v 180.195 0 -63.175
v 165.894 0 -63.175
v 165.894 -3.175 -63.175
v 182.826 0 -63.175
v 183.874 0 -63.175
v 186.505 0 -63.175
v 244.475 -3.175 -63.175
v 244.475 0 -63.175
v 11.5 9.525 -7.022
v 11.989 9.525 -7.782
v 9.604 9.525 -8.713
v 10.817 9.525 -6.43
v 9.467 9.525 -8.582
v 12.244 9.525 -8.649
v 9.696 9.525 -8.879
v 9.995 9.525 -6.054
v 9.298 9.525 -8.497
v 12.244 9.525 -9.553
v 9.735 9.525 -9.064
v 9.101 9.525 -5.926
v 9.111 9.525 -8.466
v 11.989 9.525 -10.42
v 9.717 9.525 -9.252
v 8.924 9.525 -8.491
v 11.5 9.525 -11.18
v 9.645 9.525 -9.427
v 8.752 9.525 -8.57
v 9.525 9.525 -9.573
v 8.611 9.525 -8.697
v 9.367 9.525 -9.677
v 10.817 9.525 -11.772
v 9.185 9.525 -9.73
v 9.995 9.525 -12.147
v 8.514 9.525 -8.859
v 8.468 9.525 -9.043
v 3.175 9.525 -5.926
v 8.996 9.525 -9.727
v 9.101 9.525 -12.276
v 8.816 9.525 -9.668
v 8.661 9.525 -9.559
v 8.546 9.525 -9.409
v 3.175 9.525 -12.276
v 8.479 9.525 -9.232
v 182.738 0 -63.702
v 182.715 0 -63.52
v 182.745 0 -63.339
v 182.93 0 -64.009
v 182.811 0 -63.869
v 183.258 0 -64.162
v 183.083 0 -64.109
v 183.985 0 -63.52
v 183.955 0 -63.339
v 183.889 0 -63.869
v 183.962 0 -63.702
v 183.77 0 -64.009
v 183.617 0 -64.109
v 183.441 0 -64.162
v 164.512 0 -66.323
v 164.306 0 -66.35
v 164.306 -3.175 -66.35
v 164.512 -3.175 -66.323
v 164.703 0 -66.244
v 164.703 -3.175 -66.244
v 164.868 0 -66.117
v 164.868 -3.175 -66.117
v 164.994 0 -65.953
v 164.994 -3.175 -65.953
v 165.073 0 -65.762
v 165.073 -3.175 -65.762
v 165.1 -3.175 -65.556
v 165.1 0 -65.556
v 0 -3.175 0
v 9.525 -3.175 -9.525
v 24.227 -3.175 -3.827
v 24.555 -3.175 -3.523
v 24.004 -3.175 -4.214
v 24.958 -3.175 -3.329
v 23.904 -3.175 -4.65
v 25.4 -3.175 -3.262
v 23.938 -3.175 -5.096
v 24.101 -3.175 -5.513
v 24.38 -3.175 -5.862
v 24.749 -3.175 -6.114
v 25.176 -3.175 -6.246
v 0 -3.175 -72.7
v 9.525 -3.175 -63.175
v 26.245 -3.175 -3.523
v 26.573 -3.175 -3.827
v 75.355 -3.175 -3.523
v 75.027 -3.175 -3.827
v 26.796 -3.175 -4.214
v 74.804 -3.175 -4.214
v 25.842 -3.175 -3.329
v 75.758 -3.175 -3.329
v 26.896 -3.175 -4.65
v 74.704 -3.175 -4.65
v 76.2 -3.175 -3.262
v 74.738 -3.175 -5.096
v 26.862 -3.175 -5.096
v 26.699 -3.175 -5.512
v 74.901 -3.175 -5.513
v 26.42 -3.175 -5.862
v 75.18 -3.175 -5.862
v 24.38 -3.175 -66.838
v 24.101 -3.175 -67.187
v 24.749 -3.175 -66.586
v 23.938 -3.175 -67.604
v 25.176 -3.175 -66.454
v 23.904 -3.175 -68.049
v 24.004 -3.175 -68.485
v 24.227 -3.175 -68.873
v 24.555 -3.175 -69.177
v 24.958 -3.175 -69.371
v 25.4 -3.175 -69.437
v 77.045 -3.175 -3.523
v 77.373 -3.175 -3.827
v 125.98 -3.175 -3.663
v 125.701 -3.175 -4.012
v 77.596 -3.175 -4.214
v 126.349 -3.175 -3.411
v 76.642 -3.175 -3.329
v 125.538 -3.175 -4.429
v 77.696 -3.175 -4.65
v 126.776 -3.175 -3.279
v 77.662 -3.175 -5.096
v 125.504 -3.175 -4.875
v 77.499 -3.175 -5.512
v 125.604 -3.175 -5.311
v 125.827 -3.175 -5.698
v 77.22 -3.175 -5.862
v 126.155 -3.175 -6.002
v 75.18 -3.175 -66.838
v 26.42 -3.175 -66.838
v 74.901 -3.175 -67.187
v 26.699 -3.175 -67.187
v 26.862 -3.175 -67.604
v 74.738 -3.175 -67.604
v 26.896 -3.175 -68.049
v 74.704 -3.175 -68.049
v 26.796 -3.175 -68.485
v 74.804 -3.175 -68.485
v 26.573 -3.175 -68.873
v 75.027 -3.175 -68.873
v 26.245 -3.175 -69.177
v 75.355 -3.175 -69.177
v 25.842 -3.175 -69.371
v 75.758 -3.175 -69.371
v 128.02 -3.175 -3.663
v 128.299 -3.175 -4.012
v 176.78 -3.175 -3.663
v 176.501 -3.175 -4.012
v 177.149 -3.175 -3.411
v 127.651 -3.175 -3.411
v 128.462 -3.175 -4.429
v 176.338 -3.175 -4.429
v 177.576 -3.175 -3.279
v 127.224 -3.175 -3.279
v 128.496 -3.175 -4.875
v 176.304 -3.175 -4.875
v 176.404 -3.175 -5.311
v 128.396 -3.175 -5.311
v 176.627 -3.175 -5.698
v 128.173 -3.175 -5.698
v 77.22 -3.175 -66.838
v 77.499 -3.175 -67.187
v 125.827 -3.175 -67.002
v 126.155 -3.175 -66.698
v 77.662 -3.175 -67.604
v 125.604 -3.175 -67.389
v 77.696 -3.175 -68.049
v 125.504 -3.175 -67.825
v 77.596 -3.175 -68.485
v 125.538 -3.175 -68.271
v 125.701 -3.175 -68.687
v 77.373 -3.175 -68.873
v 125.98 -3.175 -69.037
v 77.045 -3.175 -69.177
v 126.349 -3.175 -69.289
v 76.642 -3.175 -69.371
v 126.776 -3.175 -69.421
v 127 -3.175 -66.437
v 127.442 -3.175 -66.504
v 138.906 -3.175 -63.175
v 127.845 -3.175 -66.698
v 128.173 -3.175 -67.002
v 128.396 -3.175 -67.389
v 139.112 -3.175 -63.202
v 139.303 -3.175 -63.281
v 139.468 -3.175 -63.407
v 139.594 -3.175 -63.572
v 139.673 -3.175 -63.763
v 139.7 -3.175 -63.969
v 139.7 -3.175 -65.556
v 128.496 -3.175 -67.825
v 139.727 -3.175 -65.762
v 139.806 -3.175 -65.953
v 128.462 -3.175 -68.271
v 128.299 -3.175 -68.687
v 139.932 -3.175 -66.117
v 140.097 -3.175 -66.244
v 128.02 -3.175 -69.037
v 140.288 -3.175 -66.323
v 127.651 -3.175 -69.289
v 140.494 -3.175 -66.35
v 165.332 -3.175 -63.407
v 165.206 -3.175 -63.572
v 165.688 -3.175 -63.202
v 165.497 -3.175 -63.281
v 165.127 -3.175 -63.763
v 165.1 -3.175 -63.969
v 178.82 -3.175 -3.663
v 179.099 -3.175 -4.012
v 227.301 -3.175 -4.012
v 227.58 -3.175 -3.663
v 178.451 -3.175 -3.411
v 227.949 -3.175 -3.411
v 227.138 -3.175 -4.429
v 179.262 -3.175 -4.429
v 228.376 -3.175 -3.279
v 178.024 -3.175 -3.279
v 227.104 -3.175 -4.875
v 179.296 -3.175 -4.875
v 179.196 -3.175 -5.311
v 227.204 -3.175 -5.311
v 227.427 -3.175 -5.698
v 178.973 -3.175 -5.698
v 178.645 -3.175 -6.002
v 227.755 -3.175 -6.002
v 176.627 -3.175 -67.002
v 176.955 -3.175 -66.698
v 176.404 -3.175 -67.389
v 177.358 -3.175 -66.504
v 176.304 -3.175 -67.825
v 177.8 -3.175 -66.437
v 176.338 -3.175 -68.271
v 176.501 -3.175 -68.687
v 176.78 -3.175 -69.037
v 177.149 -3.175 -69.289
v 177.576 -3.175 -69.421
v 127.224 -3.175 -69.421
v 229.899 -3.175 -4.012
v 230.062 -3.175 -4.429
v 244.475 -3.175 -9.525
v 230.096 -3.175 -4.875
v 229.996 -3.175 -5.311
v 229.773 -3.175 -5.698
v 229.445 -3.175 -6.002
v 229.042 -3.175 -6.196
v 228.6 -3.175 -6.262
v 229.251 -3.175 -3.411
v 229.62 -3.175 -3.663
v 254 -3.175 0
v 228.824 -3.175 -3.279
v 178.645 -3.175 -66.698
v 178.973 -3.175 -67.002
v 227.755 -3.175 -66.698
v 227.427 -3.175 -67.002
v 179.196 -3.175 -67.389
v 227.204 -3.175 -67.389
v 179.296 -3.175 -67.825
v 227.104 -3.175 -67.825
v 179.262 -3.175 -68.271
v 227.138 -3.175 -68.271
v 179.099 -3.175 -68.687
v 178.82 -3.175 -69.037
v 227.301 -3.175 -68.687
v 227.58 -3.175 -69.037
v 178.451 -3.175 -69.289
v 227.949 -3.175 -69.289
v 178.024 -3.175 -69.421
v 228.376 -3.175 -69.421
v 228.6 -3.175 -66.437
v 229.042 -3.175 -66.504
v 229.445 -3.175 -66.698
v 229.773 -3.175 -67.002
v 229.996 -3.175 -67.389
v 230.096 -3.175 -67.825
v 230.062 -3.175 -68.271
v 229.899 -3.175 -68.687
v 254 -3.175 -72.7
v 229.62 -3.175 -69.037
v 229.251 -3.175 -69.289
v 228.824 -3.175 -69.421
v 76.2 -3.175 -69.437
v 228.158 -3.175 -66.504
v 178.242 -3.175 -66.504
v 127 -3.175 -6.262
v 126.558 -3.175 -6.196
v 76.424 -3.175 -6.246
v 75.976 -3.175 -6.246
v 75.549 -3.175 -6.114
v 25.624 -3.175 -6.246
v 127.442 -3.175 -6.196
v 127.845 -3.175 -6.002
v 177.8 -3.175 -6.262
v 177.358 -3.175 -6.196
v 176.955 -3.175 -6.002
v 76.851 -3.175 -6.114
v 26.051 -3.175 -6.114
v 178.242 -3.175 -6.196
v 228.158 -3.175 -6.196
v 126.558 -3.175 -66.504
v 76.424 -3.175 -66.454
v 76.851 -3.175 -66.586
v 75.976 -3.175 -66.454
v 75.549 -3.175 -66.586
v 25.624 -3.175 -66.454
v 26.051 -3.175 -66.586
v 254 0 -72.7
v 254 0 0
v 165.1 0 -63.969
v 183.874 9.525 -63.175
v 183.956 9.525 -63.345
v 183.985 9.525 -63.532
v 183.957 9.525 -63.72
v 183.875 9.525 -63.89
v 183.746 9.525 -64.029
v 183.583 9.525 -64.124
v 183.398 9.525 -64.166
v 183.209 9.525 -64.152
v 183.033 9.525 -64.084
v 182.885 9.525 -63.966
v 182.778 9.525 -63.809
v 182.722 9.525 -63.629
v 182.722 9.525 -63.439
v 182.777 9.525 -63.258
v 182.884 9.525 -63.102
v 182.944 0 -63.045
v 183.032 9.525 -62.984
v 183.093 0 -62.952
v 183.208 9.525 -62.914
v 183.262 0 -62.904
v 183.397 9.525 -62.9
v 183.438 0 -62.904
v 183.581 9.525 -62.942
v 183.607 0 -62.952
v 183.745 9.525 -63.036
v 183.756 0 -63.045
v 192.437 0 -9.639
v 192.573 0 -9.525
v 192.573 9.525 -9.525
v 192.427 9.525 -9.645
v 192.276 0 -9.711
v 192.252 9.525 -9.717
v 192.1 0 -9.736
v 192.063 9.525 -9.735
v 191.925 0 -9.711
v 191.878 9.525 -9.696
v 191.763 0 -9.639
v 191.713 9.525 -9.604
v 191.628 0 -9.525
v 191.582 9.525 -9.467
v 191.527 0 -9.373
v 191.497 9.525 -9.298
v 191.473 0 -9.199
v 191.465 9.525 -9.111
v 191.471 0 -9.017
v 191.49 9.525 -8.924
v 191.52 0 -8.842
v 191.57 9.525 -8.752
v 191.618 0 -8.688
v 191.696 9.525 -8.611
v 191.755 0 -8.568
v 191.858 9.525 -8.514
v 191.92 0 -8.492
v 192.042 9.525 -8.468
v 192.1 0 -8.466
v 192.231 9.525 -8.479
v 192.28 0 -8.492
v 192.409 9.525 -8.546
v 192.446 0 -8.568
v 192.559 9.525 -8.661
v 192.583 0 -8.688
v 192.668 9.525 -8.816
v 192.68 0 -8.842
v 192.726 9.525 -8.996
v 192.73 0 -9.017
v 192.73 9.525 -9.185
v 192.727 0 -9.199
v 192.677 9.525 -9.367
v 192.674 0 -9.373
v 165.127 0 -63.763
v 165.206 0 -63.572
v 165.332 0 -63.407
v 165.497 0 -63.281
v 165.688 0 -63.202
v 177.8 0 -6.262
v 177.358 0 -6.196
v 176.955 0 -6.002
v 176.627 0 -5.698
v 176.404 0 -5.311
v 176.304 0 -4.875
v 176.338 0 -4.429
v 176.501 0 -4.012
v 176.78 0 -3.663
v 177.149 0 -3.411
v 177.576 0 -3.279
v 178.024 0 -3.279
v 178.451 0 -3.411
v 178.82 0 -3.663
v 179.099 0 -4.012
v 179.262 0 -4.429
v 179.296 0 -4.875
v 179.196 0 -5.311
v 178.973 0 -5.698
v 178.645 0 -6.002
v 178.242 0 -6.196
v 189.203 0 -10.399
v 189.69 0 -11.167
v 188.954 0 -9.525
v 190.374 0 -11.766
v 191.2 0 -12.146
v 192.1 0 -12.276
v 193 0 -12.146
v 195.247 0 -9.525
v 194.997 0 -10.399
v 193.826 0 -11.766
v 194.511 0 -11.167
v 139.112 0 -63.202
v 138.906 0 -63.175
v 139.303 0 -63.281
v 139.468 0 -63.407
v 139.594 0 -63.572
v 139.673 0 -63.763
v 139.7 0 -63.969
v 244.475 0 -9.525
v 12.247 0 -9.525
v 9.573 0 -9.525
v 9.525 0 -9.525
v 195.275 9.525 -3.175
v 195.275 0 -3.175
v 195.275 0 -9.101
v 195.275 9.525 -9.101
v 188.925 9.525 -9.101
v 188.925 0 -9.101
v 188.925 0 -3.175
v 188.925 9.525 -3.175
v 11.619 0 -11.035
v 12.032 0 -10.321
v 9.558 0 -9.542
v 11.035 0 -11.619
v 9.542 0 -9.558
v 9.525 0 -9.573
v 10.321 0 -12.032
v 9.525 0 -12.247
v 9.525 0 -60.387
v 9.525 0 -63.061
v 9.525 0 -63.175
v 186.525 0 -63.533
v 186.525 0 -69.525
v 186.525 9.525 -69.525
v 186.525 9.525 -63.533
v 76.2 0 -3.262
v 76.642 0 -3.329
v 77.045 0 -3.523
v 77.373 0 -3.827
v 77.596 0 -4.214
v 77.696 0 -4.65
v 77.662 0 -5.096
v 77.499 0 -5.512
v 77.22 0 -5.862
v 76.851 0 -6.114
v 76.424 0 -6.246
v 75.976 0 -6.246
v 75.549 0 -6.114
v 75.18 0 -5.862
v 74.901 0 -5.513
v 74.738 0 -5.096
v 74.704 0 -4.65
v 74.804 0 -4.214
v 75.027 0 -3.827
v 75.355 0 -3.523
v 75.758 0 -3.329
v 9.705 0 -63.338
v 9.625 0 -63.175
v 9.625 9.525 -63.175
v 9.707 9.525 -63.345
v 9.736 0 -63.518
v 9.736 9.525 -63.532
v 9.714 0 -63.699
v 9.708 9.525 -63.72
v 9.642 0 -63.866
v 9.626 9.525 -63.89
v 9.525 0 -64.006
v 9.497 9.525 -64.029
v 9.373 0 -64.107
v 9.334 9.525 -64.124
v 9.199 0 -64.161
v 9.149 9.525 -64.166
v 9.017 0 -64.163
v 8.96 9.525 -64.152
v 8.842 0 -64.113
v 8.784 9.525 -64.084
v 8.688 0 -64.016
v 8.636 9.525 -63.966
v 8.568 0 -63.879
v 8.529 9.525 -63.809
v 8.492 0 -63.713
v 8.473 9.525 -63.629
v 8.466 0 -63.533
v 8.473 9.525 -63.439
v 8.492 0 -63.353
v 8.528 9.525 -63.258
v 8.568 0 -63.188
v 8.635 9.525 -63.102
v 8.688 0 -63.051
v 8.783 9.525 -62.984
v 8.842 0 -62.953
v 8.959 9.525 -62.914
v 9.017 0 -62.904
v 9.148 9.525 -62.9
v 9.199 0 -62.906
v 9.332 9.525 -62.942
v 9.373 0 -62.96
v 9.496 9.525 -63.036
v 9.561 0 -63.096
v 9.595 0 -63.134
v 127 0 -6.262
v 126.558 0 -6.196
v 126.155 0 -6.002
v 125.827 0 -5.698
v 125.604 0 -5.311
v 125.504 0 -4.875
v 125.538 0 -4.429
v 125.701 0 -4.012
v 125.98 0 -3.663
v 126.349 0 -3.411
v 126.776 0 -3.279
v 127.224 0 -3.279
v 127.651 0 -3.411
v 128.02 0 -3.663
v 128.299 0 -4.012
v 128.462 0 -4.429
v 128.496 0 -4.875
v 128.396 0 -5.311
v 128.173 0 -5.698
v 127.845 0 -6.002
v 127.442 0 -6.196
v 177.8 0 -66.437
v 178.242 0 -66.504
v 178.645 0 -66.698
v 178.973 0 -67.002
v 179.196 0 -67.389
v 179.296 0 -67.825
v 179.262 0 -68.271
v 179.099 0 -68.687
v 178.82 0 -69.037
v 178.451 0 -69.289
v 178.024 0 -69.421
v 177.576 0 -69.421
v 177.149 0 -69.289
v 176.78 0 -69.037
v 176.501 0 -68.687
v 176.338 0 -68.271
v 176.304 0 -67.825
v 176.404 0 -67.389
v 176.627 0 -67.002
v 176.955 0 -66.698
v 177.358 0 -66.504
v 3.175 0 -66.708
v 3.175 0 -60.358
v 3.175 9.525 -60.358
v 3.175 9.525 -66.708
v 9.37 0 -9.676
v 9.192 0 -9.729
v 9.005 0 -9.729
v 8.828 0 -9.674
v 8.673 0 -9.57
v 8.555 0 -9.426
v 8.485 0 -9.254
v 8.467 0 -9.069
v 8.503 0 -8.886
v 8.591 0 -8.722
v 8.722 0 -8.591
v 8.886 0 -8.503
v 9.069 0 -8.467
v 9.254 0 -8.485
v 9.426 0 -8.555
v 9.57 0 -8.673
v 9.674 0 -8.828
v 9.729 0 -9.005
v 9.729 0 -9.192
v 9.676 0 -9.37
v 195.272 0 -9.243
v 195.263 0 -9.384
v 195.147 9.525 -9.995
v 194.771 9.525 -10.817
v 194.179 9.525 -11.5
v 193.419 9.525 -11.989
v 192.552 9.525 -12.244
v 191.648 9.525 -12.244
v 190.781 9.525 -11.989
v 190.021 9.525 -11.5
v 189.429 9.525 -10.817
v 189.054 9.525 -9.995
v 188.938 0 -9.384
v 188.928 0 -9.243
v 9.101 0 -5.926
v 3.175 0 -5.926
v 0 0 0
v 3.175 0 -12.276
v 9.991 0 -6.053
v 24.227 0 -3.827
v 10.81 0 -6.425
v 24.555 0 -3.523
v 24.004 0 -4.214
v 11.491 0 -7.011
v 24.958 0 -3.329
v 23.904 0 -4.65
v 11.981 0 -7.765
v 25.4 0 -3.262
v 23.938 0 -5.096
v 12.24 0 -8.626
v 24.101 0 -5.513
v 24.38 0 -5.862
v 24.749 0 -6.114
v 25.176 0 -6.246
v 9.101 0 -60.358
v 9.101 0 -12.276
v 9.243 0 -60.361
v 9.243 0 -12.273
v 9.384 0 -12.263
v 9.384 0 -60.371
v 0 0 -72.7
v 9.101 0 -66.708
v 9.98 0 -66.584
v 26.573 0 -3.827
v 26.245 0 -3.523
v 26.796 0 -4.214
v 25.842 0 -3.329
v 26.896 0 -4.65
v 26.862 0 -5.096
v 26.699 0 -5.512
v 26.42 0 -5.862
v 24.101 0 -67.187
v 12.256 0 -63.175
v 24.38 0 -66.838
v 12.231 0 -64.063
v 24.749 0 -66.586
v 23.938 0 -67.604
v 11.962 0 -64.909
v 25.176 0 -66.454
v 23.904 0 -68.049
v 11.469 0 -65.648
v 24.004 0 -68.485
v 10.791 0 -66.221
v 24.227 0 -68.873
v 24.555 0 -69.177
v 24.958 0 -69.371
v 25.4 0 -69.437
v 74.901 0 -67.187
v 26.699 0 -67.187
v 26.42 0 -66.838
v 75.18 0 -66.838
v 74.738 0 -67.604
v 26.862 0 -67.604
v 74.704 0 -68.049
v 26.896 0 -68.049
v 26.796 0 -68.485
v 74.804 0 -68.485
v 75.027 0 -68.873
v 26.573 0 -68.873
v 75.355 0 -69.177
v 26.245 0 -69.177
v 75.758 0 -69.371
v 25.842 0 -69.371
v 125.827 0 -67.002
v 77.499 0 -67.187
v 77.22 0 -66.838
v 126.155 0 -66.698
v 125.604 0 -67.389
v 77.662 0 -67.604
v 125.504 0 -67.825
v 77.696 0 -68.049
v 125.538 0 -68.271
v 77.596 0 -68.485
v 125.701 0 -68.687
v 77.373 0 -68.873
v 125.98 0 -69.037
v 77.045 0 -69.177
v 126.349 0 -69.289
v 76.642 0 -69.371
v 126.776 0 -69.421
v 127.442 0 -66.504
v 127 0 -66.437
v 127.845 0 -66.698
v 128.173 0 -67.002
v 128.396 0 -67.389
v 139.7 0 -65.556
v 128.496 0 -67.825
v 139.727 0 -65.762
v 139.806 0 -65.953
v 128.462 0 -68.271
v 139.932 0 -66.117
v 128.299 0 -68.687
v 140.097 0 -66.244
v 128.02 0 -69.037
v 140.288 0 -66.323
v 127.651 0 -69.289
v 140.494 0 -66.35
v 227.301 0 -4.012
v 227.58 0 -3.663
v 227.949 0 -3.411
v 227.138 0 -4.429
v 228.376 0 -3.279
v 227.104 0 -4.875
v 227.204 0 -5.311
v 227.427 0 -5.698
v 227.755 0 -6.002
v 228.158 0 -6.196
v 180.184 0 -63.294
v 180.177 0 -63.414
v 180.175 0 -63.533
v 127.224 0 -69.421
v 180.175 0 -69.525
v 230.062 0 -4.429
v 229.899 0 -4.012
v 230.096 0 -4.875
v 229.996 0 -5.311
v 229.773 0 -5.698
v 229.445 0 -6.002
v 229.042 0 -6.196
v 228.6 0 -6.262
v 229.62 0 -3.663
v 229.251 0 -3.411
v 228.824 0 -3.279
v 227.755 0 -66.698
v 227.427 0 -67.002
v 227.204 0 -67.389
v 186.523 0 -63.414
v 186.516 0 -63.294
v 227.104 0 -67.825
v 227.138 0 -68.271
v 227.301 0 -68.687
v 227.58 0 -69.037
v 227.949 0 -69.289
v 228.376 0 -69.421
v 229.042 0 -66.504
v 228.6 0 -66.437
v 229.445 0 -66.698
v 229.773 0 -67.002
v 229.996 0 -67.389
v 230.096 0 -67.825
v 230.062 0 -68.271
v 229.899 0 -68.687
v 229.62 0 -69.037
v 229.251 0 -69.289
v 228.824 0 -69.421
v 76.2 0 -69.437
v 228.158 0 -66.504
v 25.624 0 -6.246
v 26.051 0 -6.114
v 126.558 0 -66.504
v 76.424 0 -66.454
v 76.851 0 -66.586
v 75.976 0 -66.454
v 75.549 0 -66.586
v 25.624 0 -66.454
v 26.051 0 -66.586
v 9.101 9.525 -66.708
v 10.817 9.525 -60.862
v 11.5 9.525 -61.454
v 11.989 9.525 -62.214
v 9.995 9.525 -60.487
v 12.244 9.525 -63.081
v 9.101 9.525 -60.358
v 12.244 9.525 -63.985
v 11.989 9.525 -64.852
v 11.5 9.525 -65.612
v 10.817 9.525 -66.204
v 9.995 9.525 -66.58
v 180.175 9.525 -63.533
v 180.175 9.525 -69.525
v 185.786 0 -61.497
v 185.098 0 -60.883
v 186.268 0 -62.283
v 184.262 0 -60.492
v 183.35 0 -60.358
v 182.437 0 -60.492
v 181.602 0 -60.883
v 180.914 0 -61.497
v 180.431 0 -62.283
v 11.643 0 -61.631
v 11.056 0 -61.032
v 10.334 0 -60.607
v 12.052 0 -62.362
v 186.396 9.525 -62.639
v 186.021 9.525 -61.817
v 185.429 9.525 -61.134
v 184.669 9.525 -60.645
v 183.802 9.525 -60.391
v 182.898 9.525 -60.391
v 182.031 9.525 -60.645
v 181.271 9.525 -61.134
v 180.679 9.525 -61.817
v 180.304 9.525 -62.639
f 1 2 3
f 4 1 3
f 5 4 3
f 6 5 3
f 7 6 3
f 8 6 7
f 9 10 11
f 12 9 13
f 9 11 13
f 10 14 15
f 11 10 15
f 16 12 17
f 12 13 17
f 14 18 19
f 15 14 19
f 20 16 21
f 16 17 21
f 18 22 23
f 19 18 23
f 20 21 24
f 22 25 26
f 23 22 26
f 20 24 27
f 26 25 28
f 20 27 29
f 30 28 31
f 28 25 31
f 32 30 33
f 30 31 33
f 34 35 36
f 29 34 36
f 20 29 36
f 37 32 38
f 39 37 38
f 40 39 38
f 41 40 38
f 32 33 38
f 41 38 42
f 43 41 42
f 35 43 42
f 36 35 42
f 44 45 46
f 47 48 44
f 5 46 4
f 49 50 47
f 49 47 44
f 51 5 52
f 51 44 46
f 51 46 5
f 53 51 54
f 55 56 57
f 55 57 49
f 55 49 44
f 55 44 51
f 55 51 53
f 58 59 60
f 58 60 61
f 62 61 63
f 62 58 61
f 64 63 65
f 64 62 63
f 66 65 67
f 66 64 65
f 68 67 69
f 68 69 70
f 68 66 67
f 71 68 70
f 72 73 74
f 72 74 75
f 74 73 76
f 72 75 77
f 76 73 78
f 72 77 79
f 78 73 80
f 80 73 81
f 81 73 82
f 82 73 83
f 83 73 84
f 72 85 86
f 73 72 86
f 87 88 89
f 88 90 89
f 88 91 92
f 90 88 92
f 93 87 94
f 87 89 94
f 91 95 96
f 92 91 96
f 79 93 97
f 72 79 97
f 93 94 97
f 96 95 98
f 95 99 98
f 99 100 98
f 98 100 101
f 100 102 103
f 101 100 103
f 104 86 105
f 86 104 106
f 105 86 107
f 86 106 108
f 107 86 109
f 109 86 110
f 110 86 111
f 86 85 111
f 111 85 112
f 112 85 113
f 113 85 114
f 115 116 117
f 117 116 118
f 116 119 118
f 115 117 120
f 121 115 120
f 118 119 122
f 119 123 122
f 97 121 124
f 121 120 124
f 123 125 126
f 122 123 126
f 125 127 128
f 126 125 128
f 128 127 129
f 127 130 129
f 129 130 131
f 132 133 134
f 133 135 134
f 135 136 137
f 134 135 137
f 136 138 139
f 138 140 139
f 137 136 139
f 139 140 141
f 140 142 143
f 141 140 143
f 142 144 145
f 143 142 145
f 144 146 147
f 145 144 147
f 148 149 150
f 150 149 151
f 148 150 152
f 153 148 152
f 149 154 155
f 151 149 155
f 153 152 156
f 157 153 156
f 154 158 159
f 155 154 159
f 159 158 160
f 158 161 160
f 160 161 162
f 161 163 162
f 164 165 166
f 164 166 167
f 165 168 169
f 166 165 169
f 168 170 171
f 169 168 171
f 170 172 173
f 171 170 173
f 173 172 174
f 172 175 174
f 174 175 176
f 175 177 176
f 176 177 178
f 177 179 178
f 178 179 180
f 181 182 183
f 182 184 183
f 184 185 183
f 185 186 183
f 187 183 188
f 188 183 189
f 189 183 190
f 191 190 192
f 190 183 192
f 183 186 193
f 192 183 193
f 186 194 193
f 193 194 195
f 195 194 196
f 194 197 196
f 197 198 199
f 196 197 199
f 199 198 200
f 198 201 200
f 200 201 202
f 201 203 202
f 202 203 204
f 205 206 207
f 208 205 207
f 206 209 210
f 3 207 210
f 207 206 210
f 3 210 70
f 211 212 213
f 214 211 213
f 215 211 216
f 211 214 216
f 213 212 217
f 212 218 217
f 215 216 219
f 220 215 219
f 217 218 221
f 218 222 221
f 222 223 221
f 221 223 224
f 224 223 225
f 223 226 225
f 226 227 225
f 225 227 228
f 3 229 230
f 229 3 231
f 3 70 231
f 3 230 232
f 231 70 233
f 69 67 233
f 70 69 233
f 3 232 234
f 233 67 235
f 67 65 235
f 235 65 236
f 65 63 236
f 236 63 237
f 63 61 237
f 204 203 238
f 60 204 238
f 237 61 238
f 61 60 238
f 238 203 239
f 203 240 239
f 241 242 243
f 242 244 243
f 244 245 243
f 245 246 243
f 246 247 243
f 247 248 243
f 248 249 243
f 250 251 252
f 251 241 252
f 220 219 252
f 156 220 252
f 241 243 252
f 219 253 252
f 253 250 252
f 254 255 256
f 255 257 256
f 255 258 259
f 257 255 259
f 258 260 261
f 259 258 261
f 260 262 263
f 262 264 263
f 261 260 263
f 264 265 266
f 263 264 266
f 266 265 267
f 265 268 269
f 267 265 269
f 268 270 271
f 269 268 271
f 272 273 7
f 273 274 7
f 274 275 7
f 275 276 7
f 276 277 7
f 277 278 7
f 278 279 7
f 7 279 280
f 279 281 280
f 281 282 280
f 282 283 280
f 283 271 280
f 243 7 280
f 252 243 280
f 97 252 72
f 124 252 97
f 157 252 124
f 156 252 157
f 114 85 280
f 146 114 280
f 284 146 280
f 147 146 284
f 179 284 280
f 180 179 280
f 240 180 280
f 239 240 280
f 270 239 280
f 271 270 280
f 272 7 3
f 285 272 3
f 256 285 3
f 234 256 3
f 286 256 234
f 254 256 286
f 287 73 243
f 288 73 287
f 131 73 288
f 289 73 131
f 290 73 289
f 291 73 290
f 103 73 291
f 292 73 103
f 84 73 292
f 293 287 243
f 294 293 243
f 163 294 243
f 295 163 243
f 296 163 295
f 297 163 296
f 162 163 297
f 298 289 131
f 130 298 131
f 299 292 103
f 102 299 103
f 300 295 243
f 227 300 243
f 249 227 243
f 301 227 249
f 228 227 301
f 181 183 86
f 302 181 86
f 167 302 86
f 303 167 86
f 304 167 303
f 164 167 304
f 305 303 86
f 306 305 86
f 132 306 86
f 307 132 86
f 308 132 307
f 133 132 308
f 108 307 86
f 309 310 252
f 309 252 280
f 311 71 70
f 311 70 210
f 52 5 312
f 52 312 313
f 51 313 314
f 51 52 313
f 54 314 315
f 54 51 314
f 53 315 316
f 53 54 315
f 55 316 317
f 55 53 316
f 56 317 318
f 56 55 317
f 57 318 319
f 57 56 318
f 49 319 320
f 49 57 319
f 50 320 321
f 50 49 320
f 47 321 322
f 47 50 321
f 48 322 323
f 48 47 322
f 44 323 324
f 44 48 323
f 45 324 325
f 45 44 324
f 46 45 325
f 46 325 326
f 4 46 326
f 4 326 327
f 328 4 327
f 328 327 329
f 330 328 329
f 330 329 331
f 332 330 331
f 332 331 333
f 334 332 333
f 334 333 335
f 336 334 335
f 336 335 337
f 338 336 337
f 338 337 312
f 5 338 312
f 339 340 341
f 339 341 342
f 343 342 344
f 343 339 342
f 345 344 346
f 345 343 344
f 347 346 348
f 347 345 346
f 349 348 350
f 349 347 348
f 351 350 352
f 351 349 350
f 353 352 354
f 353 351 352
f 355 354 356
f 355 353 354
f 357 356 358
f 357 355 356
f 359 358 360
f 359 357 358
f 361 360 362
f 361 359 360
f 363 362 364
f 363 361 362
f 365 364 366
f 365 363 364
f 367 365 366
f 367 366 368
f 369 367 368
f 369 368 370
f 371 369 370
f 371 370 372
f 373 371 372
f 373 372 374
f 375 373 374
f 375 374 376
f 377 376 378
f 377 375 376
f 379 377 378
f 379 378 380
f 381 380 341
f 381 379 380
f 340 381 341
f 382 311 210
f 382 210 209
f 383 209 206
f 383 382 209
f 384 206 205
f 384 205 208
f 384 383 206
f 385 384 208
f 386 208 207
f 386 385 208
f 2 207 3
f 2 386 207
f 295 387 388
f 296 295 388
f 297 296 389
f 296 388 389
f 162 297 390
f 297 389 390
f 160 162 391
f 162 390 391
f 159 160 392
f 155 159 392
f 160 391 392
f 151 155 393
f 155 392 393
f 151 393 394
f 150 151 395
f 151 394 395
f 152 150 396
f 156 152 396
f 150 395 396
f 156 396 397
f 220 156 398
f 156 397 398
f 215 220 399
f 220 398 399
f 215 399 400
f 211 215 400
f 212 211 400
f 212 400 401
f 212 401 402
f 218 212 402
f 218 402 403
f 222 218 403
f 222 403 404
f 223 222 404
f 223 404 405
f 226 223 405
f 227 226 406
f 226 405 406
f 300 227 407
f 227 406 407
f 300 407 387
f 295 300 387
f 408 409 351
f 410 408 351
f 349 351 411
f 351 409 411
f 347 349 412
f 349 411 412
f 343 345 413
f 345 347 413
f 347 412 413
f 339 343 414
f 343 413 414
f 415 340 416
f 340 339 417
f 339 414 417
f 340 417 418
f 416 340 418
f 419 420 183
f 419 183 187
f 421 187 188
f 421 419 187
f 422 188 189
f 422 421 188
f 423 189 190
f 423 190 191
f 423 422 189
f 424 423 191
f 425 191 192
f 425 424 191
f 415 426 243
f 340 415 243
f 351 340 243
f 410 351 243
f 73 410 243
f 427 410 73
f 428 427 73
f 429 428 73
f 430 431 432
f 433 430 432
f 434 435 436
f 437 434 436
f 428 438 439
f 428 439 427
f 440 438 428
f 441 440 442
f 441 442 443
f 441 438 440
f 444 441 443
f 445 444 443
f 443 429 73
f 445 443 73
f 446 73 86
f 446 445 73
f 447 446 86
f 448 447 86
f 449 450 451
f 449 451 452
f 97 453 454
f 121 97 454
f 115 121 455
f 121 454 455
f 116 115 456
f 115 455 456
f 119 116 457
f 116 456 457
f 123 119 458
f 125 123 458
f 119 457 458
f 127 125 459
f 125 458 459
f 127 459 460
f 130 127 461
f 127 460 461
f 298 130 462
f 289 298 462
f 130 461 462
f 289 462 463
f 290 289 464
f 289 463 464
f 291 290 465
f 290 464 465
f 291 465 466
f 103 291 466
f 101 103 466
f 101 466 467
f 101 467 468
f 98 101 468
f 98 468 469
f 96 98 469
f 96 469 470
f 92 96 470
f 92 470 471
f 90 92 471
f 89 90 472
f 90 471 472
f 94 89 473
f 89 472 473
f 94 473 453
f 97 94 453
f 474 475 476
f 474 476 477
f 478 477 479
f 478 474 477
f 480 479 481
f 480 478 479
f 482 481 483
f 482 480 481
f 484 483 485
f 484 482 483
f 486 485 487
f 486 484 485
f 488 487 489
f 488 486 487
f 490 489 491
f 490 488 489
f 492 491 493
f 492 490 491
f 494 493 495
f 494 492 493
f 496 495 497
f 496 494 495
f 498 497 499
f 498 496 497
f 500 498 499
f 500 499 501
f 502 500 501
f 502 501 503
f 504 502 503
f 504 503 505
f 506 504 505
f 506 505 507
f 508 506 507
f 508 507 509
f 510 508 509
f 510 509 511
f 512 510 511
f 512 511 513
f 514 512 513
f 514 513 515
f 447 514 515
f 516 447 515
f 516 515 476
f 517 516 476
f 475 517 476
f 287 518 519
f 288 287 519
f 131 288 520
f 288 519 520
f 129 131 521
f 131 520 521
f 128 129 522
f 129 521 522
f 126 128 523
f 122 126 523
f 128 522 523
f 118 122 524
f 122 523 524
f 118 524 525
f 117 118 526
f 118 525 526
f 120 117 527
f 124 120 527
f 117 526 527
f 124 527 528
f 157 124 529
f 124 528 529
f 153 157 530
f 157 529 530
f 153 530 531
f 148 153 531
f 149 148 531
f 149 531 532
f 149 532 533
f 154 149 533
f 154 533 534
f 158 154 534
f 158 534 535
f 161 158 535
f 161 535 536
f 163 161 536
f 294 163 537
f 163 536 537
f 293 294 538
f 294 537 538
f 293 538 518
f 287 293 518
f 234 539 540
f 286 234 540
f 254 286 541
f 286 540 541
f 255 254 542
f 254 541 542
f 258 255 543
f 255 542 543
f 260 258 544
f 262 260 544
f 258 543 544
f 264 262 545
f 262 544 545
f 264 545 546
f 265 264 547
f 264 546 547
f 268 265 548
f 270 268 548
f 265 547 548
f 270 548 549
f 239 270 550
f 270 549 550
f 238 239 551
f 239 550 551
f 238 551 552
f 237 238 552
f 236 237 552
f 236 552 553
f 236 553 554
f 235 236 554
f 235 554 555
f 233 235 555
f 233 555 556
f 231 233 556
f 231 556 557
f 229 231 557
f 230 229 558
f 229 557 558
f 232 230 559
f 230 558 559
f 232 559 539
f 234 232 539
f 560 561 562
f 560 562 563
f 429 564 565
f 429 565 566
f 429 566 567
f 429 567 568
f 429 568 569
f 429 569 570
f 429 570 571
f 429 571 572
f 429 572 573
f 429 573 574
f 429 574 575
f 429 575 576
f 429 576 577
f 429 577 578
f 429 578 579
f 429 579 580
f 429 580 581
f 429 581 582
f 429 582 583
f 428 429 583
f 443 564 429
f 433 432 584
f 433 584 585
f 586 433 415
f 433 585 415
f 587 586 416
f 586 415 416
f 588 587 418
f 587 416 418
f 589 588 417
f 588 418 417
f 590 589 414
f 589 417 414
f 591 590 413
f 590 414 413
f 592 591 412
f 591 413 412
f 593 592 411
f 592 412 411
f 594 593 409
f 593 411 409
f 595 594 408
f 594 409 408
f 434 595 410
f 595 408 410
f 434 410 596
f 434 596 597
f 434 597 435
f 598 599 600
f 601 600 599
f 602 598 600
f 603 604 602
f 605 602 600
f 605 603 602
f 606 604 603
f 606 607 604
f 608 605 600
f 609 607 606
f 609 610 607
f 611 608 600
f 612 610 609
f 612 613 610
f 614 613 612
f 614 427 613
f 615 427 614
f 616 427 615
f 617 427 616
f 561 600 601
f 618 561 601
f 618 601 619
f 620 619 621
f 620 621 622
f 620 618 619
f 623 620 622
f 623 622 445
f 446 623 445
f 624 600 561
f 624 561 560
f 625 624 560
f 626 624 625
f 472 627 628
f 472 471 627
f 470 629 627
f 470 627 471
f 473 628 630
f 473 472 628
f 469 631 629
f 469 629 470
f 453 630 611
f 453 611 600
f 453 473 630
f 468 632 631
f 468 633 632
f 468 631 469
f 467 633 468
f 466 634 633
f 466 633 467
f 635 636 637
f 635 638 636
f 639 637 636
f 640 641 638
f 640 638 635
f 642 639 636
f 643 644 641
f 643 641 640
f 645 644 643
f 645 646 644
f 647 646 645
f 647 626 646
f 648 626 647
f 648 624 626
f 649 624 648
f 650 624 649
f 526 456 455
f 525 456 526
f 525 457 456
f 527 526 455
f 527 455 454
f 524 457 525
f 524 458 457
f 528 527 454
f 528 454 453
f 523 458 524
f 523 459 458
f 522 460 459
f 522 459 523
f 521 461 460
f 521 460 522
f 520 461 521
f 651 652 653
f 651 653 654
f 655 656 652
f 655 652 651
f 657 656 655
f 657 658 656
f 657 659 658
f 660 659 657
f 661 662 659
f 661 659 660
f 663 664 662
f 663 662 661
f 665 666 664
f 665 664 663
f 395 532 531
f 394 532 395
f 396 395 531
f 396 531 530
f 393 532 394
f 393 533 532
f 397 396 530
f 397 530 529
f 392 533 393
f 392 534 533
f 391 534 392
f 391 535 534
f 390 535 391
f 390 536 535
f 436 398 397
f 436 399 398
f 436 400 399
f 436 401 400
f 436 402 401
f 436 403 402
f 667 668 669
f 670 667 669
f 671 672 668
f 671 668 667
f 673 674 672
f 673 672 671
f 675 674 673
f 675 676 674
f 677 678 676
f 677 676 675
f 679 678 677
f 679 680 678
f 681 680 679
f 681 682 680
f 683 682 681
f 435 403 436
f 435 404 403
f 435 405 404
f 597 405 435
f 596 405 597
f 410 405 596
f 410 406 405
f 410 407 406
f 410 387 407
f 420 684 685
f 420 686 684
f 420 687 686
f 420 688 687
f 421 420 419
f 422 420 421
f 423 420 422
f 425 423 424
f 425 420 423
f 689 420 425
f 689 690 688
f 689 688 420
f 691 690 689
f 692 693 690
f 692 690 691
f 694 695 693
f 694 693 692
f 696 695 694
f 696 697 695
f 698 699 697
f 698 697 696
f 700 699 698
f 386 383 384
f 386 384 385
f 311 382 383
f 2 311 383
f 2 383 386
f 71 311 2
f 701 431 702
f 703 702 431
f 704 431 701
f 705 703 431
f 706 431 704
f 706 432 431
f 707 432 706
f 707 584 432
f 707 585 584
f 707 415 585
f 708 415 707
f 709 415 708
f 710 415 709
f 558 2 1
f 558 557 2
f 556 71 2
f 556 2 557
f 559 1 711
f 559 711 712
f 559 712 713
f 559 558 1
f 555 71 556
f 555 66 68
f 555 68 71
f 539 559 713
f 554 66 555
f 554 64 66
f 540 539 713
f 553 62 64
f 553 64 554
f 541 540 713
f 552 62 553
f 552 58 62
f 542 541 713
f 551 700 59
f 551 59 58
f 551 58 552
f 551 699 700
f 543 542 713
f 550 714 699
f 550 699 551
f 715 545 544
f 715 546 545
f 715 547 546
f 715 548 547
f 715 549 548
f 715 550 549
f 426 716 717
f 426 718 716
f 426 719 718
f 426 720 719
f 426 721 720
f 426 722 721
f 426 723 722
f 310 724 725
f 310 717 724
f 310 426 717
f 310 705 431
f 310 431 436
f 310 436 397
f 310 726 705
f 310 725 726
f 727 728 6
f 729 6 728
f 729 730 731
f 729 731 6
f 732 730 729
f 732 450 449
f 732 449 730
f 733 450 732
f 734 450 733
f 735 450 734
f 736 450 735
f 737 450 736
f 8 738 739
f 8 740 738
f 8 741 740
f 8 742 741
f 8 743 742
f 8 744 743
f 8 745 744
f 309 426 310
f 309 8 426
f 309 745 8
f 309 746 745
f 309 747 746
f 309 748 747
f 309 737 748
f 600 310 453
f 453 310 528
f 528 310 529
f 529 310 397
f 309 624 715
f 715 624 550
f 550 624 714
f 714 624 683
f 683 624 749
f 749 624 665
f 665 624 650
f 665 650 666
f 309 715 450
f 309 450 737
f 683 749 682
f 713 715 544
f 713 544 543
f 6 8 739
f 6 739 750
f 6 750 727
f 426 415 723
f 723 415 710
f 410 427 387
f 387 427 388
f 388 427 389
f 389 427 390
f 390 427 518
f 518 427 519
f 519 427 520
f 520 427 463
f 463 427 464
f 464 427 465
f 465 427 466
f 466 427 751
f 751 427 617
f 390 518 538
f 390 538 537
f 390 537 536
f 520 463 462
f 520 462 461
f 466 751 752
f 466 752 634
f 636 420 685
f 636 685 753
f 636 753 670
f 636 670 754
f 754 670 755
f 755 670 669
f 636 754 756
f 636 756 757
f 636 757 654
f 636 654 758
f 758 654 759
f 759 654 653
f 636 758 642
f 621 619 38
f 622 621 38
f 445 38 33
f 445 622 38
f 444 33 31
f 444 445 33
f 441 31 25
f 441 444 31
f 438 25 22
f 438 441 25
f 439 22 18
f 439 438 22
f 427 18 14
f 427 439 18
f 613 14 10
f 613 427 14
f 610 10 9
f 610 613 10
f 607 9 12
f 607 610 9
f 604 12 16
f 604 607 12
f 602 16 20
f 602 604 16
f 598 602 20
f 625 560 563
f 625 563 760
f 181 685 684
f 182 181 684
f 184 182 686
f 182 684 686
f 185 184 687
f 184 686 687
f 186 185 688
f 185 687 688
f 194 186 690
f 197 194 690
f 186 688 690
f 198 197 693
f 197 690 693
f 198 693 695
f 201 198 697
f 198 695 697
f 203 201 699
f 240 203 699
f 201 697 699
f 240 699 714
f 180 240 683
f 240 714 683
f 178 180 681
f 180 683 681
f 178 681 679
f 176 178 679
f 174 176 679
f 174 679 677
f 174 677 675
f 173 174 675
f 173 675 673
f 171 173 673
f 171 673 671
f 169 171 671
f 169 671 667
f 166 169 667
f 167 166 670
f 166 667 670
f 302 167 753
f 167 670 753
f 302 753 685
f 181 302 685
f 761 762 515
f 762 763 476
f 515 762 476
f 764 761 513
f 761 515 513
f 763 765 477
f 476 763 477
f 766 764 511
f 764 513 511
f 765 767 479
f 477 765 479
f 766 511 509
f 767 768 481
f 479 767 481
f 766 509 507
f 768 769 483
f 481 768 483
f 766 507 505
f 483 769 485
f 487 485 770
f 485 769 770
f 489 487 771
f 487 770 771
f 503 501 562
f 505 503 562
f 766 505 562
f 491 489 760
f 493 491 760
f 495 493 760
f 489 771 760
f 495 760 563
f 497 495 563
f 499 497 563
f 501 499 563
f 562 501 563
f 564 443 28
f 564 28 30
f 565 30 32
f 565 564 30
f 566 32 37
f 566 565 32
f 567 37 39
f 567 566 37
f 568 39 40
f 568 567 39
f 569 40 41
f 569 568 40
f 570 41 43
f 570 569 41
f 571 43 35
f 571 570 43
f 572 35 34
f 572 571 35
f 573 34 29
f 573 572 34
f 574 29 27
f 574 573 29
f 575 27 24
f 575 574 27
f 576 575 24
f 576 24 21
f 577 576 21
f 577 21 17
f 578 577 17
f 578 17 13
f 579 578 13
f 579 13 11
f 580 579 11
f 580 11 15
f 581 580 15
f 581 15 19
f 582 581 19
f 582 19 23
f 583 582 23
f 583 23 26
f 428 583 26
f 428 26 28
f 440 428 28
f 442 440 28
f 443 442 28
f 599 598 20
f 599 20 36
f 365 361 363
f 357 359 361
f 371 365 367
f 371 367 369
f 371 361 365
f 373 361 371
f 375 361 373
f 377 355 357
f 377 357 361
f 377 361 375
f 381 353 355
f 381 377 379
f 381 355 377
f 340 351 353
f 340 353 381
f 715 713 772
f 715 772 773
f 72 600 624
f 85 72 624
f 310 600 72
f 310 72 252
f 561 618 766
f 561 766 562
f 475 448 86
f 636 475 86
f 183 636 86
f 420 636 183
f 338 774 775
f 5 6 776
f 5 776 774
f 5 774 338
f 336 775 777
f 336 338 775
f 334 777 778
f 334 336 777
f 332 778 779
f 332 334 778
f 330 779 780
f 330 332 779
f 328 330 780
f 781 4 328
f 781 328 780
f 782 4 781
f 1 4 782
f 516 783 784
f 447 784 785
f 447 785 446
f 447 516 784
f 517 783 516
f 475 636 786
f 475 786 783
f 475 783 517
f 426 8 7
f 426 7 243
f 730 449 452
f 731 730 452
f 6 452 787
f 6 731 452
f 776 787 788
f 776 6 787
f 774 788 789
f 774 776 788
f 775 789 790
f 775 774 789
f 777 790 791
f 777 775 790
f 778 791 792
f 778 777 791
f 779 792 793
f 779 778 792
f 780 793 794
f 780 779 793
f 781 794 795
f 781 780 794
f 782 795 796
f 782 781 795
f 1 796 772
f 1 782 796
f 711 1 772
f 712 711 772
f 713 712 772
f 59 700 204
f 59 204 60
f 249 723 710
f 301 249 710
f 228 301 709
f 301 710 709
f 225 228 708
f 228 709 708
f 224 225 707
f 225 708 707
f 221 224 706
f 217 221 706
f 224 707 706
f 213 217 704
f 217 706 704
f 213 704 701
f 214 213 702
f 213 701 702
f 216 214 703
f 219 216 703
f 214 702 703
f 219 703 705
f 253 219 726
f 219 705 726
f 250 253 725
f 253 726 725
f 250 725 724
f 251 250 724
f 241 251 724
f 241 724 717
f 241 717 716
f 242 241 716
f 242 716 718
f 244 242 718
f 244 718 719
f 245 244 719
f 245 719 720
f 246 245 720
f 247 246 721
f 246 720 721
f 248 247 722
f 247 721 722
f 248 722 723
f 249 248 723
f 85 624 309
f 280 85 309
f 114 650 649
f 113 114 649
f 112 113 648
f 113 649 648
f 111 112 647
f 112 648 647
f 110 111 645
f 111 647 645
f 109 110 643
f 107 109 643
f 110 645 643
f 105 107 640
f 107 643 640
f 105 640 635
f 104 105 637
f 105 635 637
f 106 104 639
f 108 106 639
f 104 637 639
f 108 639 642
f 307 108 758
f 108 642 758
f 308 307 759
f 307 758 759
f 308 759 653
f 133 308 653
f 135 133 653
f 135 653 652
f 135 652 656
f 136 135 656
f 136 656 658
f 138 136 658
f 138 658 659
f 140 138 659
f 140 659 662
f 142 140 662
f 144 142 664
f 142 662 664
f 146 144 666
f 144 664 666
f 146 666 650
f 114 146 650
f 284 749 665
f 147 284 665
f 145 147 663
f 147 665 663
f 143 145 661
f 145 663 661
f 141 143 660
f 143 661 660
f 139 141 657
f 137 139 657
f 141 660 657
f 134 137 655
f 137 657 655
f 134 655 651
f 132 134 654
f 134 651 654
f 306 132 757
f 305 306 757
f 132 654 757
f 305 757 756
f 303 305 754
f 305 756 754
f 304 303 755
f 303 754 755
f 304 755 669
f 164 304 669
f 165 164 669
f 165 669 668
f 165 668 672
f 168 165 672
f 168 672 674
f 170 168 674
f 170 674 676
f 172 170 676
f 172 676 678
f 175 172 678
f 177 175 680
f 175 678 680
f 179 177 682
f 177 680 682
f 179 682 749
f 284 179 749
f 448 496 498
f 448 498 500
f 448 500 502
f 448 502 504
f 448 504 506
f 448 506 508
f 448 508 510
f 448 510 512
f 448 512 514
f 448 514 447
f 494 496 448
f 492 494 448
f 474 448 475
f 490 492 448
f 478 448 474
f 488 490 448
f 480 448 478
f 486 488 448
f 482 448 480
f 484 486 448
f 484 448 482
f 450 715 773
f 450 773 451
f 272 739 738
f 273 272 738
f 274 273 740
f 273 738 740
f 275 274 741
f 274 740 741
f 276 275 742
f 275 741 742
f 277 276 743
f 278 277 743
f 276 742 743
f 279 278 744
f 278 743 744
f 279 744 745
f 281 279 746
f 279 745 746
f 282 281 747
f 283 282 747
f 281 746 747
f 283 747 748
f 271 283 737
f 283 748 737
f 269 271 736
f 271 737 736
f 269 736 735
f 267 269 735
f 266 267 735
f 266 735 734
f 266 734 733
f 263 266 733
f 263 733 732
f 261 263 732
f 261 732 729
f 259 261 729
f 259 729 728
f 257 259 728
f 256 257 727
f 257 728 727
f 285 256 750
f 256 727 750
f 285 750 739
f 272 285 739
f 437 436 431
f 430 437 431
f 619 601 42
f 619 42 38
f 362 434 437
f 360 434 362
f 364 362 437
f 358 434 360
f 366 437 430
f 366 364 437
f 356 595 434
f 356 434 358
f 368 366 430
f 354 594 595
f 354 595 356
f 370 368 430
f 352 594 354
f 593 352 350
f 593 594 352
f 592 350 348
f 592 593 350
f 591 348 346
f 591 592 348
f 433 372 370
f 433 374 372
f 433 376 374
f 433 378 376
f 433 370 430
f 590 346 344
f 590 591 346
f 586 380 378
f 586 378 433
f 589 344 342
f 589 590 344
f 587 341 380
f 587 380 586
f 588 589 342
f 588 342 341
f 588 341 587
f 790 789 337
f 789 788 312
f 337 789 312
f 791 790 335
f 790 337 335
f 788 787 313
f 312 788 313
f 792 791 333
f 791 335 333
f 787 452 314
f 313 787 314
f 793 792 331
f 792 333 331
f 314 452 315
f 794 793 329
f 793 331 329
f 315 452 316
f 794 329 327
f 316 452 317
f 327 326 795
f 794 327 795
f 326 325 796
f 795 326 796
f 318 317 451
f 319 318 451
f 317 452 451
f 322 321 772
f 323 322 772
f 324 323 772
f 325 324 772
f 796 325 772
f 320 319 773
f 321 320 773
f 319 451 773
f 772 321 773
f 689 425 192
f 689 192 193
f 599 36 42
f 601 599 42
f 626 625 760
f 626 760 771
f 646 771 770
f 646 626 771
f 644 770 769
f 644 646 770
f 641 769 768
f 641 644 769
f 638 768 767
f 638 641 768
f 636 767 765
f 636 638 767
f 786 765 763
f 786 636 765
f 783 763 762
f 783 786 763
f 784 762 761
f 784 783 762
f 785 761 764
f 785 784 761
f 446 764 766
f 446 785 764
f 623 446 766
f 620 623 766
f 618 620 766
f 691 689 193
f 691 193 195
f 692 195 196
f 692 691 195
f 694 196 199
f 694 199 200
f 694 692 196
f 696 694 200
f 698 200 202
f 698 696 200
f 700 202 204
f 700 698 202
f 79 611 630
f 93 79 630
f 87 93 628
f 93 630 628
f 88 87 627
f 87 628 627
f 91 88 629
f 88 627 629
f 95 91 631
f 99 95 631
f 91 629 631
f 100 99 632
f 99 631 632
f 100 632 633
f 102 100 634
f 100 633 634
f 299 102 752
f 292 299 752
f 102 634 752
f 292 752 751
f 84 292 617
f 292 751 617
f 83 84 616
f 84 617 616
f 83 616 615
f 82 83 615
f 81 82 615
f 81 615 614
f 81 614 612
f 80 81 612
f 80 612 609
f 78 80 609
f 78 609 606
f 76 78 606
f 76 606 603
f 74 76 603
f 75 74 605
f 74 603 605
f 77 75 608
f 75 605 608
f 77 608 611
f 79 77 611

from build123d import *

# Parameters (mm, degrees)
SKETCH1_W           = 254
SKETCH1_H           = 72.69988
SKETCH1_R           = 1.5
BOSS_EXTRUDE1_DEPTH = 3.175
SKETCH1_7_R         = 0.635
BOSS_EXTRUDE2_DEPTH = 9.525


with BuildPart() as part:
    # Sketch1 → Boss-Extrude1 (new body)
    with BuildSketch(Plane(origin=(0, 0, 0), x_dir=(1, 0, 0), z_dir=(0, 1, 0))):
        with Locations((127, 36.34994)):
            Rectangle(SKETCH1_W, SKETCH1_H)
        with Locations((25.4, 4.7625)):
            Circle(SKETCH1_R, mode=Mode.SUBTRACT)
        with Locations((76.2, 4.7625)):
            Circle(SKETCH1_R, mode=Mode.SUBTRACT)
        with Locations((127, 4.7625)):
            Circle(SKETCH1_R, mode=Mode.SUBTRACT)
        with Locations((177.8, 4.7625)):
            Circle(SKETCH1_R, mode=Mode.SUBTRACT)
        with Locations((228.6, 4.7625)):
            Circle(SKETCH1_R, mode=Mode.SUBTRACT)
        with BuildLine():
            Line((244.475, 63.17488), (244.475, 9.525))
            Line((244.475, 9.525), (9.525, 9.525))
            Line((9.525, 9.525), (9.525, 63.17488))
            Line((9.525, 63.17488), (138.90625, 63.17488))
            ThreePointArc((138.90625, 63.17488), (139.467516008, 63.407363992), (139.7, 63.96863))
            Line((139.7, 63.96863), (139.7, 65.55613))
            ThreePointArc((139.7, 65.55613), (139.932483992, 66.117396008), (140.49375, 66.34988))
            Line((140.49375, 66.34988), (164.30625, 66.34988))
            ThreePointArc((164.30625, 66.34988), (164.867516008, 66.117396008), (165.1, 65.55613))
            Line((165.1, 65.55613), (165.1, 63.96863))
            ThreePointArc((165.1, 63.96863), (165.332483992, 63.407363992), (165.89375, 63.17488))
            Line((165.89375, 63.17488), (244.475, 63.17488))
        make_face(mode=Mode.SUBTRACT)
        with Locations((25.4, 67.93738)):
            Circle(SKETCH1_R, mode=Mode.SUBTRACT)
        with Locations((76.2, 67.93738)):
            Circle(SKETCH1_R, mode=Mode.SUBTRACT)
        with Locations((127, 67.93738)):
            Circle(SKETCH1_R, mode=Mode.SUBTRACT)
        with Locations((177.8, 67.93738)):
            Circle(SKETCH1_R, mode=Mode.SUBTRACT)
        with Locations((228.6, 67.93738)):
            Circle(SKETCH1_R, mode=Mode.SUBTRACT)
    extrude(amount=-BOSS_EXTRUDE1_DEPTH)

    # Sketch1<7> → Boss-Extrude2 (add)
    # profile 1 of 4: a face of its own
    with BuildSketch(Plane(origin=(0, 0, 0), x_dir=(1, 0, 0), z_dir=(0, 1, 0))):
        with BuildLine():
            Line((180.1749, 69.52488), (186.5249, 69.52488))
            Line((186.5249, 69.52488), (186.5249, 63.533223536))
            ThreePointArc((186.5249, 63.533223536), (183.3499, 60.358223536), (180.1749, 63.533223536))
            Line((180.1749, 63.533223536), (180.1749, 69.52488))
        make_face()
        with Locations((183.3499, 63.533223536)):
            Circle(SKETCH1_7_R, mode=Mode.SUBTRACT)
    # profile 2 of 4: a face of its own
    with BuildSketch(Plane(origin=(0, 0, 0), x_dir=(1, 0, 0), z_dir=(0, 1, 0))):
        with BuildLine():
            Line((188.9252, 9.10082), (188.9252, 3.175))
            Line((188.9252, 3.175), (195.2752, 3.175))
            Line((195.2752, 3.175), (195.2752, 9.10082))
            ThreePointArc((195.2752, 9.10082), (192.1002, 12.27582), (188.9252, 9.10082))
        make_face()
        with Locations((192.1002, 9.10082)):
            Circle(SKETCH1_7_R, mode=Mode.SUBTRACT)
    # profile 3 of 4: a face of its own
    with BuildSketch(Plane(origin=(0, 0, 0), x_dir=(1, 0, 0), z_dir=(0, 1, 0))):
        with BuildLine():
            Line((3.175, 12.27582), (9.10082, 12.27582))
            ThreePointArc((9.10082, 12.27582), (12.27582, 9.10082), (9.10082, 5.92582))
            Line((9.10082, 5.92582), (3.175, 5.92582))
            Line((3.175, 5.92582), (3.175, 12.27582))
        make_face()
        with Locations((9.10082, 9.10082)):
            Circle(SKETCH1_7_R, mode=Mode.SUBTRACT)
    # profile 4 of 4: a face of its own
    with BuildSketch(Plane(origin=(0, 0, 0), x_dir=(1, 0, 0), z_dir=(0, 1, 0))):
        with BuildLine():
            Line((3.175, 66.708223536), (9.10082, 66.708223536))
            ThreePointArc((9.10082, 66.708223536), (12.27582, 63.533223536), (9.10082, 60.358223536))
            Line((9.10082, 60.358223536), (3.175, 60.358223536))
            Line((3.175, 60.358223536), (3.175, 66.708223536))
        make_face()
        with Locations((9.10082, 63.533223536)):
            Circle(SKETCH1_7_R, mode=Mode.SUBTRACT)
    extrude(amount=BOSS_EXTRUDE2_DEPTH)


solid = part.part
